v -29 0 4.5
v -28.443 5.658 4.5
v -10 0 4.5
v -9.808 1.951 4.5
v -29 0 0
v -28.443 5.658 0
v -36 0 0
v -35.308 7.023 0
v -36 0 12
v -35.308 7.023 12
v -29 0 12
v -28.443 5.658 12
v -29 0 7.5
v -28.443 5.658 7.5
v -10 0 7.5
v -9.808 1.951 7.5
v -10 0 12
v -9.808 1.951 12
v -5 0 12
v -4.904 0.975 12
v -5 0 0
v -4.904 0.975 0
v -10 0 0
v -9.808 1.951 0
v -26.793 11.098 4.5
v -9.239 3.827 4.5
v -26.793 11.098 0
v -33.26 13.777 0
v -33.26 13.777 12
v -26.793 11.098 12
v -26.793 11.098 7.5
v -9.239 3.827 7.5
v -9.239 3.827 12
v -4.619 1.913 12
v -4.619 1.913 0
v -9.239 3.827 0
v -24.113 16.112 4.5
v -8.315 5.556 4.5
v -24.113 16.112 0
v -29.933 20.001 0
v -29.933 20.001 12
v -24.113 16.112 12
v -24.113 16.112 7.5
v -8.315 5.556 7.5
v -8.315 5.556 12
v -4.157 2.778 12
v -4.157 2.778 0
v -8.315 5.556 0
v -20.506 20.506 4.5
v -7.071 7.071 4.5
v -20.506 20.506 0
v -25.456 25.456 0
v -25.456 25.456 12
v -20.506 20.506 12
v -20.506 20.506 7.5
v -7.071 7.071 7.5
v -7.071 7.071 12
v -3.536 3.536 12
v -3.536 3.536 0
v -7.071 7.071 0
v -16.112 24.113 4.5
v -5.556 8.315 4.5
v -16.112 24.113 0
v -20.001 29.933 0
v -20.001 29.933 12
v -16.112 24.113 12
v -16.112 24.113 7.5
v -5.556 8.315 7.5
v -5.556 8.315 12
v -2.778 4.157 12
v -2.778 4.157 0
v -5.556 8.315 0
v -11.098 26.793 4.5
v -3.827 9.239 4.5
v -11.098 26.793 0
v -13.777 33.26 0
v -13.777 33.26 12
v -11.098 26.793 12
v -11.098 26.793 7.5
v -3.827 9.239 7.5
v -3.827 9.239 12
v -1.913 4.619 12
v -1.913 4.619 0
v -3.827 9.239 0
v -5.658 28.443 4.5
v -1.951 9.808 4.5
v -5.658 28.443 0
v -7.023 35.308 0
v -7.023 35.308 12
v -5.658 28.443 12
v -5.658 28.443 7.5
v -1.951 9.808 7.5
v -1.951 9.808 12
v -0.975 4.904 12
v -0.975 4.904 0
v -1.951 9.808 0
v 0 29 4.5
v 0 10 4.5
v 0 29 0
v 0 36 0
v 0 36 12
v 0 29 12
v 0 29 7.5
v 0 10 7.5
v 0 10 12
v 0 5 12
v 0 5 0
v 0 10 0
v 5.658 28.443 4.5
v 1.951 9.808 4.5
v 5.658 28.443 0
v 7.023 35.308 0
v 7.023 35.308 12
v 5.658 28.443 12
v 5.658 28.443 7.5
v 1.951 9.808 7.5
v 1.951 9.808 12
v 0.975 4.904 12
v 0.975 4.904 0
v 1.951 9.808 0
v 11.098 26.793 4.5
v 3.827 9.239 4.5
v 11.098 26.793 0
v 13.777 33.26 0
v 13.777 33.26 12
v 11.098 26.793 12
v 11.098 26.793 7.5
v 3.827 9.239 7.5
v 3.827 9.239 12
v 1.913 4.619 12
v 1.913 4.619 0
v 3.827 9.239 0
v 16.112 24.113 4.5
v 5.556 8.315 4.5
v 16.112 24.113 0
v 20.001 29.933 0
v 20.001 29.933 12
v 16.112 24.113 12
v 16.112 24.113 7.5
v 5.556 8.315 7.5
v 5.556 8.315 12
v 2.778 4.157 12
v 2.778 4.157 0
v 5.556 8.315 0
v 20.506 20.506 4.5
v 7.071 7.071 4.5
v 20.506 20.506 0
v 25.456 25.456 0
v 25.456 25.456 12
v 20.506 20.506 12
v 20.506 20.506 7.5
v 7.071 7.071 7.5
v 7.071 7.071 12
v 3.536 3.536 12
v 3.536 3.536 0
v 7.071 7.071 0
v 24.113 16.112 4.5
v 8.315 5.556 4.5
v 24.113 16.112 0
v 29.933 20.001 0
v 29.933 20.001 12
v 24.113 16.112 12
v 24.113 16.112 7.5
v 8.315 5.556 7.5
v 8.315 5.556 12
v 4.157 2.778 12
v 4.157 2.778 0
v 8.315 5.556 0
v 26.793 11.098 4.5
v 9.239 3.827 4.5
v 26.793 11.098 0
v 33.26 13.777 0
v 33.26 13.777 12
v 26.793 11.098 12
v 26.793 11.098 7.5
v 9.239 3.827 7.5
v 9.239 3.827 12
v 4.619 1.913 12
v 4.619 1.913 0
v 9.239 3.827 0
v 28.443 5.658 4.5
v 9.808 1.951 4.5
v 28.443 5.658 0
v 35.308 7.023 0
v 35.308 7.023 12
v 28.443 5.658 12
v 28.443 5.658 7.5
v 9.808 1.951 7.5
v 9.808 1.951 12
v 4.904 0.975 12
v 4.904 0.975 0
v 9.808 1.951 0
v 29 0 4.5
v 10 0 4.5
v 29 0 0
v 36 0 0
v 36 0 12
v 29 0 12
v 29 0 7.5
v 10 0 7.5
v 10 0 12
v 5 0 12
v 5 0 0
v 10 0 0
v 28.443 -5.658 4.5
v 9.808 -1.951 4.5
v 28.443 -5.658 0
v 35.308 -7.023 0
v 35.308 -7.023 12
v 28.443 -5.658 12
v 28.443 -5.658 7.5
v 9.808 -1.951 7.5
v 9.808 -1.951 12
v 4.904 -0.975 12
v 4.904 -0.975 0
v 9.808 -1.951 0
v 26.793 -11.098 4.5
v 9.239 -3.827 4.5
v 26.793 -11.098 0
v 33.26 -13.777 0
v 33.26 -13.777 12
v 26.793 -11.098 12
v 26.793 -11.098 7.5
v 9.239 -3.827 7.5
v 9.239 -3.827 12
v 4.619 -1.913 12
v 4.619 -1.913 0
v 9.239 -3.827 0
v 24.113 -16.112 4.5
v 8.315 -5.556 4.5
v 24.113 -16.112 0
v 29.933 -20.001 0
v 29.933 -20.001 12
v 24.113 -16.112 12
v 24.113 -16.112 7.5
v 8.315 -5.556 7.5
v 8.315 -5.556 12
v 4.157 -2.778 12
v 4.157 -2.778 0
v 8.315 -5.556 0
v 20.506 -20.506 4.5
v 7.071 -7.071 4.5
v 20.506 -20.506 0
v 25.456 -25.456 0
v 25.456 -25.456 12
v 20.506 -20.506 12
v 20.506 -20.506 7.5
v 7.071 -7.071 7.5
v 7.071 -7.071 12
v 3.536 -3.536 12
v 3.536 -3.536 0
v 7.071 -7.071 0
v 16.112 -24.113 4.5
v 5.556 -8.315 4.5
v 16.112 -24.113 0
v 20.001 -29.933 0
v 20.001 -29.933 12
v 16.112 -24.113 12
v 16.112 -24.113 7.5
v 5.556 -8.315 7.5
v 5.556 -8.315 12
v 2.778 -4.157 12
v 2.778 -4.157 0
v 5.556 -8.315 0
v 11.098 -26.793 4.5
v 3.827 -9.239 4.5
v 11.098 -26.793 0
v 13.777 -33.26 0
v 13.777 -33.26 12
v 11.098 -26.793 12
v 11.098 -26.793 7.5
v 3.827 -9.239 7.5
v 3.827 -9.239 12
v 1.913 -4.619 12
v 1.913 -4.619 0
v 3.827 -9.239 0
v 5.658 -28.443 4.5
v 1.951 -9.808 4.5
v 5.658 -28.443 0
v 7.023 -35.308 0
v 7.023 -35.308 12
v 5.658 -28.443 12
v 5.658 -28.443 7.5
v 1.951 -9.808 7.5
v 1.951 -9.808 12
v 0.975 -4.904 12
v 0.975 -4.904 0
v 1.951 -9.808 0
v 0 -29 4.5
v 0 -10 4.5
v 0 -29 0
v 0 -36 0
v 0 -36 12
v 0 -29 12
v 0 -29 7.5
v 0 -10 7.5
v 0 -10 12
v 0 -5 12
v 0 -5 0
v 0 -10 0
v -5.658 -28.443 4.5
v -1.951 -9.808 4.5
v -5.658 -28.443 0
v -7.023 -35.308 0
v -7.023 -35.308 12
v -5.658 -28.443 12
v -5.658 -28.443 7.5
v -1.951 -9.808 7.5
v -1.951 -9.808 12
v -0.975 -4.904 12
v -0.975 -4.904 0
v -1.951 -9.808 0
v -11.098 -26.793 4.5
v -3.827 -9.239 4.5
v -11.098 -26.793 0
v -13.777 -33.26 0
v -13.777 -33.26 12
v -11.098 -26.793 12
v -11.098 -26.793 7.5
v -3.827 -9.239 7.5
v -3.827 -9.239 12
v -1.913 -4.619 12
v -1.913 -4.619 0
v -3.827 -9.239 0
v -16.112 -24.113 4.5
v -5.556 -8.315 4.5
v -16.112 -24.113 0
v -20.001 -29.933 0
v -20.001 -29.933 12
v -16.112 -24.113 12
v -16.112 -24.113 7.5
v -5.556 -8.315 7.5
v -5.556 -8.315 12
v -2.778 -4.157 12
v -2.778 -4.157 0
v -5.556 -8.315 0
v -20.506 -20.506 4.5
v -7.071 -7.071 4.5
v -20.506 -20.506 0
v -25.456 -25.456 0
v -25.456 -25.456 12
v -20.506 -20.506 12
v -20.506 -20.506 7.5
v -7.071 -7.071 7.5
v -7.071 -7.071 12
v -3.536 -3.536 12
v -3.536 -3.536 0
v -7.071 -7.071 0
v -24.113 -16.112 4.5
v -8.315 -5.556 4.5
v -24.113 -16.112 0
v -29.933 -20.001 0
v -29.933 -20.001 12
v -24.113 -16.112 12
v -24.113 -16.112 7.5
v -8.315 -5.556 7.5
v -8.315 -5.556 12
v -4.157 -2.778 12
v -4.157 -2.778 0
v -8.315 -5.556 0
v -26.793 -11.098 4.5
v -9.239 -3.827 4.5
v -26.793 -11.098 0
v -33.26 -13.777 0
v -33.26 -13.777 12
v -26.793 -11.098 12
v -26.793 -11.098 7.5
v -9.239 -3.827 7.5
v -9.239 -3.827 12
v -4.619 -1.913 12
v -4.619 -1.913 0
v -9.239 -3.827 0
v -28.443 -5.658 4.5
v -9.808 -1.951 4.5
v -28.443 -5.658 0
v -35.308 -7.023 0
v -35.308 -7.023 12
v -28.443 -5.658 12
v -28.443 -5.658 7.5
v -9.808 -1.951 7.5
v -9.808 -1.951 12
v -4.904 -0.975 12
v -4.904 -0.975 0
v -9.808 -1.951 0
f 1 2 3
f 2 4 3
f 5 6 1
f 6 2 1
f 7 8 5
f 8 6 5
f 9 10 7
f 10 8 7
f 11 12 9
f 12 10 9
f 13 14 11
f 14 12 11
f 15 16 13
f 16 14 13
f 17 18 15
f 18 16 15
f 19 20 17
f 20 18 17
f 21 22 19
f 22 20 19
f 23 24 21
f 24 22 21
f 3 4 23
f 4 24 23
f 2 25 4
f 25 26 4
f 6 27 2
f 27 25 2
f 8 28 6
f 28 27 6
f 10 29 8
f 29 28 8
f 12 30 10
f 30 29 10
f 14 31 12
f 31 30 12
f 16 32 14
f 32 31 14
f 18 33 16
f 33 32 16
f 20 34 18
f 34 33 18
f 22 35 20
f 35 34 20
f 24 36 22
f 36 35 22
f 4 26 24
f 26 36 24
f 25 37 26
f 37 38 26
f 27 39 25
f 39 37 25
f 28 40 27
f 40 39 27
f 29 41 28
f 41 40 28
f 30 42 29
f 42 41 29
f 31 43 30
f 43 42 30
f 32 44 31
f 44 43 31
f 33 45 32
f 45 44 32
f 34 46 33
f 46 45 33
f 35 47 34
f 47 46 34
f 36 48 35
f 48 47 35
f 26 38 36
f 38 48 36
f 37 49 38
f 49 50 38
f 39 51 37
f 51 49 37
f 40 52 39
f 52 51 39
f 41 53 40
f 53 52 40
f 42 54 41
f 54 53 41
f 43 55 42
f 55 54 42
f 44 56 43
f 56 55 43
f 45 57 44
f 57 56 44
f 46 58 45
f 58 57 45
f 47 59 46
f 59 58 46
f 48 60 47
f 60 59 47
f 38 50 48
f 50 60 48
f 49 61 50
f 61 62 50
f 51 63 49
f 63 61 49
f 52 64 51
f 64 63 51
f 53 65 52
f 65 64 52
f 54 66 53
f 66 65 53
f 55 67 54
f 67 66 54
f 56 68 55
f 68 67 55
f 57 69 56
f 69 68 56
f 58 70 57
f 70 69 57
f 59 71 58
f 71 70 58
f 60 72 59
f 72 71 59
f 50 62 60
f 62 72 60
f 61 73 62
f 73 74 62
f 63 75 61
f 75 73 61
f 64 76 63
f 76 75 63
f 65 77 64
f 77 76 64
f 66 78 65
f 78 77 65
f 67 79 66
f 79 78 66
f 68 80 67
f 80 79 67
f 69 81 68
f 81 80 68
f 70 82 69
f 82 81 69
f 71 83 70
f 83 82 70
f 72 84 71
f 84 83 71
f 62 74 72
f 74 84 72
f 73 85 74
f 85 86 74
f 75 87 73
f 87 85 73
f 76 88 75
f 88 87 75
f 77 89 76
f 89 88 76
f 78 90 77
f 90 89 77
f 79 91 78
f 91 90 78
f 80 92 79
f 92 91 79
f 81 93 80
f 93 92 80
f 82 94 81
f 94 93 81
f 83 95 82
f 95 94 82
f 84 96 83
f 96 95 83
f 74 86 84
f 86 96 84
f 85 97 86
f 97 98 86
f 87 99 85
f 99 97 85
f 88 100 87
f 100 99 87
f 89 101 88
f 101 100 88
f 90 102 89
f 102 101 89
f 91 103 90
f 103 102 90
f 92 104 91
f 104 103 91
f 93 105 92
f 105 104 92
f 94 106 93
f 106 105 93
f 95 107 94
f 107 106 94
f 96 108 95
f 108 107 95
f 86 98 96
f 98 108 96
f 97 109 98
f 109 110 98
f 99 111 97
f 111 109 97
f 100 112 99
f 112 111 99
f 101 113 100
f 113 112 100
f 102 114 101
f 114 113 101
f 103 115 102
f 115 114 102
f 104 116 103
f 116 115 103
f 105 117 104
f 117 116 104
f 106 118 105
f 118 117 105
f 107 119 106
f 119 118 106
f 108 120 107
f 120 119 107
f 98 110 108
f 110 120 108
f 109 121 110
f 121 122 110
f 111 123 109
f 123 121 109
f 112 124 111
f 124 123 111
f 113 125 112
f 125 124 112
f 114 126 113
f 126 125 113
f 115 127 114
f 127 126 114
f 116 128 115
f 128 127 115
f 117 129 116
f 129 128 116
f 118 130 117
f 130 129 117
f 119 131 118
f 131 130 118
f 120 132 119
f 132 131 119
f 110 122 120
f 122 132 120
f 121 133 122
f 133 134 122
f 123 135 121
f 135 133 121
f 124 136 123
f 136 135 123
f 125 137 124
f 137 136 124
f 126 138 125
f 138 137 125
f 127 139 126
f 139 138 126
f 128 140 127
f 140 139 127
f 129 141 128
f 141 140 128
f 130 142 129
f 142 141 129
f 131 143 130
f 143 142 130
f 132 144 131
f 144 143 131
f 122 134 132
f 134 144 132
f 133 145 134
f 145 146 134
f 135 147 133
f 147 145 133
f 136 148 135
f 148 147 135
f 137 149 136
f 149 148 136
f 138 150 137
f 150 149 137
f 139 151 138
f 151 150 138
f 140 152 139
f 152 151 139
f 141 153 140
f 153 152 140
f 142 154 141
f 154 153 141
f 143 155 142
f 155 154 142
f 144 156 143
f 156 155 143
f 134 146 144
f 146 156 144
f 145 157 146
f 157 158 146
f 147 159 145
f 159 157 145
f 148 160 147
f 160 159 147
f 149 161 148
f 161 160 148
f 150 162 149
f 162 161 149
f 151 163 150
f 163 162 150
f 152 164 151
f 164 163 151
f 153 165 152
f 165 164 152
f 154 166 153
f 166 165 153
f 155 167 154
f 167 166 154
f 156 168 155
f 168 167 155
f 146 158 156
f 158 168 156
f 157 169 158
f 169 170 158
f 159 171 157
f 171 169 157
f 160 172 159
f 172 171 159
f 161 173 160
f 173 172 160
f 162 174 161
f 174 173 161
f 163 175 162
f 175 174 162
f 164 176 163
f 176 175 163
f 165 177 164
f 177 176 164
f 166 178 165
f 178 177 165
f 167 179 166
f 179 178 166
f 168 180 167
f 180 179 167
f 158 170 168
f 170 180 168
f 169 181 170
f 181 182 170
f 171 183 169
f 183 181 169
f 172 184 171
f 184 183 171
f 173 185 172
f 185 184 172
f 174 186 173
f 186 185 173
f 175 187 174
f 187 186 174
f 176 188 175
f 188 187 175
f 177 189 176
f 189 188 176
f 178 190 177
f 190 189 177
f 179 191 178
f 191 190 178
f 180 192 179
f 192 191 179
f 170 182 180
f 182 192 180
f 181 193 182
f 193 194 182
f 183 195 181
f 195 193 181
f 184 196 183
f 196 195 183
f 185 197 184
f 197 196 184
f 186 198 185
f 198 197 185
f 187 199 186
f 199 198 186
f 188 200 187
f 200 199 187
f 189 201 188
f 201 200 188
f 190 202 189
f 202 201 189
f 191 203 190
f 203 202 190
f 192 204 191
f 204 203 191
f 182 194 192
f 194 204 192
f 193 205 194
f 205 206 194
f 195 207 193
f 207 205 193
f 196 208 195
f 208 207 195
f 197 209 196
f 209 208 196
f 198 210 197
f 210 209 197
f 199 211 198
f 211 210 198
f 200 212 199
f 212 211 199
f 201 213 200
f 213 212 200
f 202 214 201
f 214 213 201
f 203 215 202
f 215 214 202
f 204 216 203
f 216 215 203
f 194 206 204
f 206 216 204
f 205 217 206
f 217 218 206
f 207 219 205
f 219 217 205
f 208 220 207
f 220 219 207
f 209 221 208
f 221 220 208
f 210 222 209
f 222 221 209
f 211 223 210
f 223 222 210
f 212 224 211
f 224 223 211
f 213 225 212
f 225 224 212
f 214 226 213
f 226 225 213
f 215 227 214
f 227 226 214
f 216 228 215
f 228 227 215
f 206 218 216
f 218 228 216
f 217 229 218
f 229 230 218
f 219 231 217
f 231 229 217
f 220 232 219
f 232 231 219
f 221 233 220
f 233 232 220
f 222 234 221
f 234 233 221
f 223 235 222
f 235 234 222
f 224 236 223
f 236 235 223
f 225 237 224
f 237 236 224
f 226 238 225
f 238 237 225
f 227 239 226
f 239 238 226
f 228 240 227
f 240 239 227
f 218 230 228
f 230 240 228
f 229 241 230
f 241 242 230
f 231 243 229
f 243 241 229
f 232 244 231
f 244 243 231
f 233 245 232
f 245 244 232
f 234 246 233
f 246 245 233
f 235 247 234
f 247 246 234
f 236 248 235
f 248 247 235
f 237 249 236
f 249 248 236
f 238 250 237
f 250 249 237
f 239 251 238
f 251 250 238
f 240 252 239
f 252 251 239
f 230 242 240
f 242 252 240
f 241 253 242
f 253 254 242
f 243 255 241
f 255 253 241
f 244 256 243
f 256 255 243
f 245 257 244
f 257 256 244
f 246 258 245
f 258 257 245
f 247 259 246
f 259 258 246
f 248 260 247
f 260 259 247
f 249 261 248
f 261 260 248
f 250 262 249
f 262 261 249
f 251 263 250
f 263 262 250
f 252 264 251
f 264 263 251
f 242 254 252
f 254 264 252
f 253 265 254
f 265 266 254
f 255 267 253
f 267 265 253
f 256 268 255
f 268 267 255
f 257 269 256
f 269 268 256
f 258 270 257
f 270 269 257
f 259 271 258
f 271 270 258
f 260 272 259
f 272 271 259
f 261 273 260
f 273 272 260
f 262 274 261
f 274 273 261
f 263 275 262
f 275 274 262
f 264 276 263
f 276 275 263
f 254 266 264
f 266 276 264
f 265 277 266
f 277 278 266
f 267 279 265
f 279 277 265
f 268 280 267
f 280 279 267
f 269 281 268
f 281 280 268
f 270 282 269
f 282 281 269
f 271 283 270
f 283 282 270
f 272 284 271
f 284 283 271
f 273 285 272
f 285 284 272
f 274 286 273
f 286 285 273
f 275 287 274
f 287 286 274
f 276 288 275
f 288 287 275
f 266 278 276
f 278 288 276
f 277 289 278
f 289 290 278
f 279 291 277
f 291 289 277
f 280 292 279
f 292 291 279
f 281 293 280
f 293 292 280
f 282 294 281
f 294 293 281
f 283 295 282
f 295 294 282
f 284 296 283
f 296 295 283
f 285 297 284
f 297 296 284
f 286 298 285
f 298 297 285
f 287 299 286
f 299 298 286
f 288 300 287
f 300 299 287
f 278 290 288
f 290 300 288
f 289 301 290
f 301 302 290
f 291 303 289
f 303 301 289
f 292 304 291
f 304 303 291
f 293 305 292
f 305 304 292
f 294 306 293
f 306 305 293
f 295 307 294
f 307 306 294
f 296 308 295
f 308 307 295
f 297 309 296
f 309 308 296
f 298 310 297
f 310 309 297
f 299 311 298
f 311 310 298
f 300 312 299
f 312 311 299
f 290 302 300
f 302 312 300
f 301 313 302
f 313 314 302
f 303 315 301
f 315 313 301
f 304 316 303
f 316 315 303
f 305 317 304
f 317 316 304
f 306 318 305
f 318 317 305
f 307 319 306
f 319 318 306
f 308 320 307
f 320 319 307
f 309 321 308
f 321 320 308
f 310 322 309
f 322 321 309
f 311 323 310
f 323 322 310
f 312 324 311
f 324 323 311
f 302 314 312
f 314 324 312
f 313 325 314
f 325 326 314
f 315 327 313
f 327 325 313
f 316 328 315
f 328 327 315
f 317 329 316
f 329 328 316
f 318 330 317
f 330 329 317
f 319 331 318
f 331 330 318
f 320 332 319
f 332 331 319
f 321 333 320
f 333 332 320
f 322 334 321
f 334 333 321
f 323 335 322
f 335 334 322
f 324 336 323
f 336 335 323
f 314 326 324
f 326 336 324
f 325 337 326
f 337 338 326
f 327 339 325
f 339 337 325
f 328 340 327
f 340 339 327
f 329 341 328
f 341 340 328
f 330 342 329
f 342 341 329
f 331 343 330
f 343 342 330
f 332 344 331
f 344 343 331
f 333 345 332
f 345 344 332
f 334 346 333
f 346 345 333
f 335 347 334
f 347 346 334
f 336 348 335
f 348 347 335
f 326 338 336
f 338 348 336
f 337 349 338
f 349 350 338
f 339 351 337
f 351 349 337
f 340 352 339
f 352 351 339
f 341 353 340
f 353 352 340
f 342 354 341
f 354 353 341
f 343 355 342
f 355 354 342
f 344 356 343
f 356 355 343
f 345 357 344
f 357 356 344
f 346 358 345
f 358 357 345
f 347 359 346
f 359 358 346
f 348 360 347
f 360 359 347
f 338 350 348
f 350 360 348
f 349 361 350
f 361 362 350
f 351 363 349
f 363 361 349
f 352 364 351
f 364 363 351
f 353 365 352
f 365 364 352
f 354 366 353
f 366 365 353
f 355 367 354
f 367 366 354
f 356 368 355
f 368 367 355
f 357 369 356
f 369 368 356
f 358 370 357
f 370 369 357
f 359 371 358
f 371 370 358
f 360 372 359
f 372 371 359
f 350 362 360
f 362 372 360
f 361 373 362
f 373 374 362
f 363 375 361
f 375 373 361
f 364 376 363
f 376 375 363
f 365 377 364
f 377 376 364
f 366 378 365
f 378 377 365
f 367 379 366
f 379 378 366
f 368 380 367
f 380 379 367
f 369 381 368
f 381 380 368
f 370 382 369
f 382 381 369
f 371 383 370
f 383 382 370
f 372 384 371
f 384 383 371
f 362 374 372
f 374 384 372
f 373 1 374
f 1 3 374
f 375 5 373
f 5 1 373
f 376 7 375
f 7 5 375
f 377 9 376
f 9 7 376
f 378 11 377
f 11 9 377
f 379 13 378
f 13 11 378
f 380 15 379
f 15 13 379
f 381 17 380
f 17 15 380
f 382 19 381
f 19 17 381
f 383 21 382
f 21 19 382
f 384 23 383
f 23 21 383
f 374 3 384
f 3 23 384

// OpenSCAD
$fn = 32;

// ----------------------------------------------------------------------
// Revolved part: handwheel R36
// ----------------------------------------------------------------------

// --- parameters (mm) ---
bore_r = 5;               // bore radius
rim_r = 36;               // rim radius
rim_w = 7;                // rim axial width
rim_t = 12;               // rim diameter height
hub_r = 10;               // hub radius
web_t = 3;                // web thickness
revolve_angle = 360;      // revolve sweep, degrees

bore_d = 2 * bore_r;
rim_d = 2 * rim_r;
hub_d = 2 * hub_r;

profile = [[5, 0], [10, 0], [10, 4.5], [29, 4.5], [29, 0], [36, 0], [36, 12], [29, 12], [29, 7.5], [10, 7.5], [10, 12], [5, 12]];  // primary outline, 12 points, counter clockwise

// --- the one profile operation ---
rotate_extrude(angle = revolve_angle) polygon(points = profile);
